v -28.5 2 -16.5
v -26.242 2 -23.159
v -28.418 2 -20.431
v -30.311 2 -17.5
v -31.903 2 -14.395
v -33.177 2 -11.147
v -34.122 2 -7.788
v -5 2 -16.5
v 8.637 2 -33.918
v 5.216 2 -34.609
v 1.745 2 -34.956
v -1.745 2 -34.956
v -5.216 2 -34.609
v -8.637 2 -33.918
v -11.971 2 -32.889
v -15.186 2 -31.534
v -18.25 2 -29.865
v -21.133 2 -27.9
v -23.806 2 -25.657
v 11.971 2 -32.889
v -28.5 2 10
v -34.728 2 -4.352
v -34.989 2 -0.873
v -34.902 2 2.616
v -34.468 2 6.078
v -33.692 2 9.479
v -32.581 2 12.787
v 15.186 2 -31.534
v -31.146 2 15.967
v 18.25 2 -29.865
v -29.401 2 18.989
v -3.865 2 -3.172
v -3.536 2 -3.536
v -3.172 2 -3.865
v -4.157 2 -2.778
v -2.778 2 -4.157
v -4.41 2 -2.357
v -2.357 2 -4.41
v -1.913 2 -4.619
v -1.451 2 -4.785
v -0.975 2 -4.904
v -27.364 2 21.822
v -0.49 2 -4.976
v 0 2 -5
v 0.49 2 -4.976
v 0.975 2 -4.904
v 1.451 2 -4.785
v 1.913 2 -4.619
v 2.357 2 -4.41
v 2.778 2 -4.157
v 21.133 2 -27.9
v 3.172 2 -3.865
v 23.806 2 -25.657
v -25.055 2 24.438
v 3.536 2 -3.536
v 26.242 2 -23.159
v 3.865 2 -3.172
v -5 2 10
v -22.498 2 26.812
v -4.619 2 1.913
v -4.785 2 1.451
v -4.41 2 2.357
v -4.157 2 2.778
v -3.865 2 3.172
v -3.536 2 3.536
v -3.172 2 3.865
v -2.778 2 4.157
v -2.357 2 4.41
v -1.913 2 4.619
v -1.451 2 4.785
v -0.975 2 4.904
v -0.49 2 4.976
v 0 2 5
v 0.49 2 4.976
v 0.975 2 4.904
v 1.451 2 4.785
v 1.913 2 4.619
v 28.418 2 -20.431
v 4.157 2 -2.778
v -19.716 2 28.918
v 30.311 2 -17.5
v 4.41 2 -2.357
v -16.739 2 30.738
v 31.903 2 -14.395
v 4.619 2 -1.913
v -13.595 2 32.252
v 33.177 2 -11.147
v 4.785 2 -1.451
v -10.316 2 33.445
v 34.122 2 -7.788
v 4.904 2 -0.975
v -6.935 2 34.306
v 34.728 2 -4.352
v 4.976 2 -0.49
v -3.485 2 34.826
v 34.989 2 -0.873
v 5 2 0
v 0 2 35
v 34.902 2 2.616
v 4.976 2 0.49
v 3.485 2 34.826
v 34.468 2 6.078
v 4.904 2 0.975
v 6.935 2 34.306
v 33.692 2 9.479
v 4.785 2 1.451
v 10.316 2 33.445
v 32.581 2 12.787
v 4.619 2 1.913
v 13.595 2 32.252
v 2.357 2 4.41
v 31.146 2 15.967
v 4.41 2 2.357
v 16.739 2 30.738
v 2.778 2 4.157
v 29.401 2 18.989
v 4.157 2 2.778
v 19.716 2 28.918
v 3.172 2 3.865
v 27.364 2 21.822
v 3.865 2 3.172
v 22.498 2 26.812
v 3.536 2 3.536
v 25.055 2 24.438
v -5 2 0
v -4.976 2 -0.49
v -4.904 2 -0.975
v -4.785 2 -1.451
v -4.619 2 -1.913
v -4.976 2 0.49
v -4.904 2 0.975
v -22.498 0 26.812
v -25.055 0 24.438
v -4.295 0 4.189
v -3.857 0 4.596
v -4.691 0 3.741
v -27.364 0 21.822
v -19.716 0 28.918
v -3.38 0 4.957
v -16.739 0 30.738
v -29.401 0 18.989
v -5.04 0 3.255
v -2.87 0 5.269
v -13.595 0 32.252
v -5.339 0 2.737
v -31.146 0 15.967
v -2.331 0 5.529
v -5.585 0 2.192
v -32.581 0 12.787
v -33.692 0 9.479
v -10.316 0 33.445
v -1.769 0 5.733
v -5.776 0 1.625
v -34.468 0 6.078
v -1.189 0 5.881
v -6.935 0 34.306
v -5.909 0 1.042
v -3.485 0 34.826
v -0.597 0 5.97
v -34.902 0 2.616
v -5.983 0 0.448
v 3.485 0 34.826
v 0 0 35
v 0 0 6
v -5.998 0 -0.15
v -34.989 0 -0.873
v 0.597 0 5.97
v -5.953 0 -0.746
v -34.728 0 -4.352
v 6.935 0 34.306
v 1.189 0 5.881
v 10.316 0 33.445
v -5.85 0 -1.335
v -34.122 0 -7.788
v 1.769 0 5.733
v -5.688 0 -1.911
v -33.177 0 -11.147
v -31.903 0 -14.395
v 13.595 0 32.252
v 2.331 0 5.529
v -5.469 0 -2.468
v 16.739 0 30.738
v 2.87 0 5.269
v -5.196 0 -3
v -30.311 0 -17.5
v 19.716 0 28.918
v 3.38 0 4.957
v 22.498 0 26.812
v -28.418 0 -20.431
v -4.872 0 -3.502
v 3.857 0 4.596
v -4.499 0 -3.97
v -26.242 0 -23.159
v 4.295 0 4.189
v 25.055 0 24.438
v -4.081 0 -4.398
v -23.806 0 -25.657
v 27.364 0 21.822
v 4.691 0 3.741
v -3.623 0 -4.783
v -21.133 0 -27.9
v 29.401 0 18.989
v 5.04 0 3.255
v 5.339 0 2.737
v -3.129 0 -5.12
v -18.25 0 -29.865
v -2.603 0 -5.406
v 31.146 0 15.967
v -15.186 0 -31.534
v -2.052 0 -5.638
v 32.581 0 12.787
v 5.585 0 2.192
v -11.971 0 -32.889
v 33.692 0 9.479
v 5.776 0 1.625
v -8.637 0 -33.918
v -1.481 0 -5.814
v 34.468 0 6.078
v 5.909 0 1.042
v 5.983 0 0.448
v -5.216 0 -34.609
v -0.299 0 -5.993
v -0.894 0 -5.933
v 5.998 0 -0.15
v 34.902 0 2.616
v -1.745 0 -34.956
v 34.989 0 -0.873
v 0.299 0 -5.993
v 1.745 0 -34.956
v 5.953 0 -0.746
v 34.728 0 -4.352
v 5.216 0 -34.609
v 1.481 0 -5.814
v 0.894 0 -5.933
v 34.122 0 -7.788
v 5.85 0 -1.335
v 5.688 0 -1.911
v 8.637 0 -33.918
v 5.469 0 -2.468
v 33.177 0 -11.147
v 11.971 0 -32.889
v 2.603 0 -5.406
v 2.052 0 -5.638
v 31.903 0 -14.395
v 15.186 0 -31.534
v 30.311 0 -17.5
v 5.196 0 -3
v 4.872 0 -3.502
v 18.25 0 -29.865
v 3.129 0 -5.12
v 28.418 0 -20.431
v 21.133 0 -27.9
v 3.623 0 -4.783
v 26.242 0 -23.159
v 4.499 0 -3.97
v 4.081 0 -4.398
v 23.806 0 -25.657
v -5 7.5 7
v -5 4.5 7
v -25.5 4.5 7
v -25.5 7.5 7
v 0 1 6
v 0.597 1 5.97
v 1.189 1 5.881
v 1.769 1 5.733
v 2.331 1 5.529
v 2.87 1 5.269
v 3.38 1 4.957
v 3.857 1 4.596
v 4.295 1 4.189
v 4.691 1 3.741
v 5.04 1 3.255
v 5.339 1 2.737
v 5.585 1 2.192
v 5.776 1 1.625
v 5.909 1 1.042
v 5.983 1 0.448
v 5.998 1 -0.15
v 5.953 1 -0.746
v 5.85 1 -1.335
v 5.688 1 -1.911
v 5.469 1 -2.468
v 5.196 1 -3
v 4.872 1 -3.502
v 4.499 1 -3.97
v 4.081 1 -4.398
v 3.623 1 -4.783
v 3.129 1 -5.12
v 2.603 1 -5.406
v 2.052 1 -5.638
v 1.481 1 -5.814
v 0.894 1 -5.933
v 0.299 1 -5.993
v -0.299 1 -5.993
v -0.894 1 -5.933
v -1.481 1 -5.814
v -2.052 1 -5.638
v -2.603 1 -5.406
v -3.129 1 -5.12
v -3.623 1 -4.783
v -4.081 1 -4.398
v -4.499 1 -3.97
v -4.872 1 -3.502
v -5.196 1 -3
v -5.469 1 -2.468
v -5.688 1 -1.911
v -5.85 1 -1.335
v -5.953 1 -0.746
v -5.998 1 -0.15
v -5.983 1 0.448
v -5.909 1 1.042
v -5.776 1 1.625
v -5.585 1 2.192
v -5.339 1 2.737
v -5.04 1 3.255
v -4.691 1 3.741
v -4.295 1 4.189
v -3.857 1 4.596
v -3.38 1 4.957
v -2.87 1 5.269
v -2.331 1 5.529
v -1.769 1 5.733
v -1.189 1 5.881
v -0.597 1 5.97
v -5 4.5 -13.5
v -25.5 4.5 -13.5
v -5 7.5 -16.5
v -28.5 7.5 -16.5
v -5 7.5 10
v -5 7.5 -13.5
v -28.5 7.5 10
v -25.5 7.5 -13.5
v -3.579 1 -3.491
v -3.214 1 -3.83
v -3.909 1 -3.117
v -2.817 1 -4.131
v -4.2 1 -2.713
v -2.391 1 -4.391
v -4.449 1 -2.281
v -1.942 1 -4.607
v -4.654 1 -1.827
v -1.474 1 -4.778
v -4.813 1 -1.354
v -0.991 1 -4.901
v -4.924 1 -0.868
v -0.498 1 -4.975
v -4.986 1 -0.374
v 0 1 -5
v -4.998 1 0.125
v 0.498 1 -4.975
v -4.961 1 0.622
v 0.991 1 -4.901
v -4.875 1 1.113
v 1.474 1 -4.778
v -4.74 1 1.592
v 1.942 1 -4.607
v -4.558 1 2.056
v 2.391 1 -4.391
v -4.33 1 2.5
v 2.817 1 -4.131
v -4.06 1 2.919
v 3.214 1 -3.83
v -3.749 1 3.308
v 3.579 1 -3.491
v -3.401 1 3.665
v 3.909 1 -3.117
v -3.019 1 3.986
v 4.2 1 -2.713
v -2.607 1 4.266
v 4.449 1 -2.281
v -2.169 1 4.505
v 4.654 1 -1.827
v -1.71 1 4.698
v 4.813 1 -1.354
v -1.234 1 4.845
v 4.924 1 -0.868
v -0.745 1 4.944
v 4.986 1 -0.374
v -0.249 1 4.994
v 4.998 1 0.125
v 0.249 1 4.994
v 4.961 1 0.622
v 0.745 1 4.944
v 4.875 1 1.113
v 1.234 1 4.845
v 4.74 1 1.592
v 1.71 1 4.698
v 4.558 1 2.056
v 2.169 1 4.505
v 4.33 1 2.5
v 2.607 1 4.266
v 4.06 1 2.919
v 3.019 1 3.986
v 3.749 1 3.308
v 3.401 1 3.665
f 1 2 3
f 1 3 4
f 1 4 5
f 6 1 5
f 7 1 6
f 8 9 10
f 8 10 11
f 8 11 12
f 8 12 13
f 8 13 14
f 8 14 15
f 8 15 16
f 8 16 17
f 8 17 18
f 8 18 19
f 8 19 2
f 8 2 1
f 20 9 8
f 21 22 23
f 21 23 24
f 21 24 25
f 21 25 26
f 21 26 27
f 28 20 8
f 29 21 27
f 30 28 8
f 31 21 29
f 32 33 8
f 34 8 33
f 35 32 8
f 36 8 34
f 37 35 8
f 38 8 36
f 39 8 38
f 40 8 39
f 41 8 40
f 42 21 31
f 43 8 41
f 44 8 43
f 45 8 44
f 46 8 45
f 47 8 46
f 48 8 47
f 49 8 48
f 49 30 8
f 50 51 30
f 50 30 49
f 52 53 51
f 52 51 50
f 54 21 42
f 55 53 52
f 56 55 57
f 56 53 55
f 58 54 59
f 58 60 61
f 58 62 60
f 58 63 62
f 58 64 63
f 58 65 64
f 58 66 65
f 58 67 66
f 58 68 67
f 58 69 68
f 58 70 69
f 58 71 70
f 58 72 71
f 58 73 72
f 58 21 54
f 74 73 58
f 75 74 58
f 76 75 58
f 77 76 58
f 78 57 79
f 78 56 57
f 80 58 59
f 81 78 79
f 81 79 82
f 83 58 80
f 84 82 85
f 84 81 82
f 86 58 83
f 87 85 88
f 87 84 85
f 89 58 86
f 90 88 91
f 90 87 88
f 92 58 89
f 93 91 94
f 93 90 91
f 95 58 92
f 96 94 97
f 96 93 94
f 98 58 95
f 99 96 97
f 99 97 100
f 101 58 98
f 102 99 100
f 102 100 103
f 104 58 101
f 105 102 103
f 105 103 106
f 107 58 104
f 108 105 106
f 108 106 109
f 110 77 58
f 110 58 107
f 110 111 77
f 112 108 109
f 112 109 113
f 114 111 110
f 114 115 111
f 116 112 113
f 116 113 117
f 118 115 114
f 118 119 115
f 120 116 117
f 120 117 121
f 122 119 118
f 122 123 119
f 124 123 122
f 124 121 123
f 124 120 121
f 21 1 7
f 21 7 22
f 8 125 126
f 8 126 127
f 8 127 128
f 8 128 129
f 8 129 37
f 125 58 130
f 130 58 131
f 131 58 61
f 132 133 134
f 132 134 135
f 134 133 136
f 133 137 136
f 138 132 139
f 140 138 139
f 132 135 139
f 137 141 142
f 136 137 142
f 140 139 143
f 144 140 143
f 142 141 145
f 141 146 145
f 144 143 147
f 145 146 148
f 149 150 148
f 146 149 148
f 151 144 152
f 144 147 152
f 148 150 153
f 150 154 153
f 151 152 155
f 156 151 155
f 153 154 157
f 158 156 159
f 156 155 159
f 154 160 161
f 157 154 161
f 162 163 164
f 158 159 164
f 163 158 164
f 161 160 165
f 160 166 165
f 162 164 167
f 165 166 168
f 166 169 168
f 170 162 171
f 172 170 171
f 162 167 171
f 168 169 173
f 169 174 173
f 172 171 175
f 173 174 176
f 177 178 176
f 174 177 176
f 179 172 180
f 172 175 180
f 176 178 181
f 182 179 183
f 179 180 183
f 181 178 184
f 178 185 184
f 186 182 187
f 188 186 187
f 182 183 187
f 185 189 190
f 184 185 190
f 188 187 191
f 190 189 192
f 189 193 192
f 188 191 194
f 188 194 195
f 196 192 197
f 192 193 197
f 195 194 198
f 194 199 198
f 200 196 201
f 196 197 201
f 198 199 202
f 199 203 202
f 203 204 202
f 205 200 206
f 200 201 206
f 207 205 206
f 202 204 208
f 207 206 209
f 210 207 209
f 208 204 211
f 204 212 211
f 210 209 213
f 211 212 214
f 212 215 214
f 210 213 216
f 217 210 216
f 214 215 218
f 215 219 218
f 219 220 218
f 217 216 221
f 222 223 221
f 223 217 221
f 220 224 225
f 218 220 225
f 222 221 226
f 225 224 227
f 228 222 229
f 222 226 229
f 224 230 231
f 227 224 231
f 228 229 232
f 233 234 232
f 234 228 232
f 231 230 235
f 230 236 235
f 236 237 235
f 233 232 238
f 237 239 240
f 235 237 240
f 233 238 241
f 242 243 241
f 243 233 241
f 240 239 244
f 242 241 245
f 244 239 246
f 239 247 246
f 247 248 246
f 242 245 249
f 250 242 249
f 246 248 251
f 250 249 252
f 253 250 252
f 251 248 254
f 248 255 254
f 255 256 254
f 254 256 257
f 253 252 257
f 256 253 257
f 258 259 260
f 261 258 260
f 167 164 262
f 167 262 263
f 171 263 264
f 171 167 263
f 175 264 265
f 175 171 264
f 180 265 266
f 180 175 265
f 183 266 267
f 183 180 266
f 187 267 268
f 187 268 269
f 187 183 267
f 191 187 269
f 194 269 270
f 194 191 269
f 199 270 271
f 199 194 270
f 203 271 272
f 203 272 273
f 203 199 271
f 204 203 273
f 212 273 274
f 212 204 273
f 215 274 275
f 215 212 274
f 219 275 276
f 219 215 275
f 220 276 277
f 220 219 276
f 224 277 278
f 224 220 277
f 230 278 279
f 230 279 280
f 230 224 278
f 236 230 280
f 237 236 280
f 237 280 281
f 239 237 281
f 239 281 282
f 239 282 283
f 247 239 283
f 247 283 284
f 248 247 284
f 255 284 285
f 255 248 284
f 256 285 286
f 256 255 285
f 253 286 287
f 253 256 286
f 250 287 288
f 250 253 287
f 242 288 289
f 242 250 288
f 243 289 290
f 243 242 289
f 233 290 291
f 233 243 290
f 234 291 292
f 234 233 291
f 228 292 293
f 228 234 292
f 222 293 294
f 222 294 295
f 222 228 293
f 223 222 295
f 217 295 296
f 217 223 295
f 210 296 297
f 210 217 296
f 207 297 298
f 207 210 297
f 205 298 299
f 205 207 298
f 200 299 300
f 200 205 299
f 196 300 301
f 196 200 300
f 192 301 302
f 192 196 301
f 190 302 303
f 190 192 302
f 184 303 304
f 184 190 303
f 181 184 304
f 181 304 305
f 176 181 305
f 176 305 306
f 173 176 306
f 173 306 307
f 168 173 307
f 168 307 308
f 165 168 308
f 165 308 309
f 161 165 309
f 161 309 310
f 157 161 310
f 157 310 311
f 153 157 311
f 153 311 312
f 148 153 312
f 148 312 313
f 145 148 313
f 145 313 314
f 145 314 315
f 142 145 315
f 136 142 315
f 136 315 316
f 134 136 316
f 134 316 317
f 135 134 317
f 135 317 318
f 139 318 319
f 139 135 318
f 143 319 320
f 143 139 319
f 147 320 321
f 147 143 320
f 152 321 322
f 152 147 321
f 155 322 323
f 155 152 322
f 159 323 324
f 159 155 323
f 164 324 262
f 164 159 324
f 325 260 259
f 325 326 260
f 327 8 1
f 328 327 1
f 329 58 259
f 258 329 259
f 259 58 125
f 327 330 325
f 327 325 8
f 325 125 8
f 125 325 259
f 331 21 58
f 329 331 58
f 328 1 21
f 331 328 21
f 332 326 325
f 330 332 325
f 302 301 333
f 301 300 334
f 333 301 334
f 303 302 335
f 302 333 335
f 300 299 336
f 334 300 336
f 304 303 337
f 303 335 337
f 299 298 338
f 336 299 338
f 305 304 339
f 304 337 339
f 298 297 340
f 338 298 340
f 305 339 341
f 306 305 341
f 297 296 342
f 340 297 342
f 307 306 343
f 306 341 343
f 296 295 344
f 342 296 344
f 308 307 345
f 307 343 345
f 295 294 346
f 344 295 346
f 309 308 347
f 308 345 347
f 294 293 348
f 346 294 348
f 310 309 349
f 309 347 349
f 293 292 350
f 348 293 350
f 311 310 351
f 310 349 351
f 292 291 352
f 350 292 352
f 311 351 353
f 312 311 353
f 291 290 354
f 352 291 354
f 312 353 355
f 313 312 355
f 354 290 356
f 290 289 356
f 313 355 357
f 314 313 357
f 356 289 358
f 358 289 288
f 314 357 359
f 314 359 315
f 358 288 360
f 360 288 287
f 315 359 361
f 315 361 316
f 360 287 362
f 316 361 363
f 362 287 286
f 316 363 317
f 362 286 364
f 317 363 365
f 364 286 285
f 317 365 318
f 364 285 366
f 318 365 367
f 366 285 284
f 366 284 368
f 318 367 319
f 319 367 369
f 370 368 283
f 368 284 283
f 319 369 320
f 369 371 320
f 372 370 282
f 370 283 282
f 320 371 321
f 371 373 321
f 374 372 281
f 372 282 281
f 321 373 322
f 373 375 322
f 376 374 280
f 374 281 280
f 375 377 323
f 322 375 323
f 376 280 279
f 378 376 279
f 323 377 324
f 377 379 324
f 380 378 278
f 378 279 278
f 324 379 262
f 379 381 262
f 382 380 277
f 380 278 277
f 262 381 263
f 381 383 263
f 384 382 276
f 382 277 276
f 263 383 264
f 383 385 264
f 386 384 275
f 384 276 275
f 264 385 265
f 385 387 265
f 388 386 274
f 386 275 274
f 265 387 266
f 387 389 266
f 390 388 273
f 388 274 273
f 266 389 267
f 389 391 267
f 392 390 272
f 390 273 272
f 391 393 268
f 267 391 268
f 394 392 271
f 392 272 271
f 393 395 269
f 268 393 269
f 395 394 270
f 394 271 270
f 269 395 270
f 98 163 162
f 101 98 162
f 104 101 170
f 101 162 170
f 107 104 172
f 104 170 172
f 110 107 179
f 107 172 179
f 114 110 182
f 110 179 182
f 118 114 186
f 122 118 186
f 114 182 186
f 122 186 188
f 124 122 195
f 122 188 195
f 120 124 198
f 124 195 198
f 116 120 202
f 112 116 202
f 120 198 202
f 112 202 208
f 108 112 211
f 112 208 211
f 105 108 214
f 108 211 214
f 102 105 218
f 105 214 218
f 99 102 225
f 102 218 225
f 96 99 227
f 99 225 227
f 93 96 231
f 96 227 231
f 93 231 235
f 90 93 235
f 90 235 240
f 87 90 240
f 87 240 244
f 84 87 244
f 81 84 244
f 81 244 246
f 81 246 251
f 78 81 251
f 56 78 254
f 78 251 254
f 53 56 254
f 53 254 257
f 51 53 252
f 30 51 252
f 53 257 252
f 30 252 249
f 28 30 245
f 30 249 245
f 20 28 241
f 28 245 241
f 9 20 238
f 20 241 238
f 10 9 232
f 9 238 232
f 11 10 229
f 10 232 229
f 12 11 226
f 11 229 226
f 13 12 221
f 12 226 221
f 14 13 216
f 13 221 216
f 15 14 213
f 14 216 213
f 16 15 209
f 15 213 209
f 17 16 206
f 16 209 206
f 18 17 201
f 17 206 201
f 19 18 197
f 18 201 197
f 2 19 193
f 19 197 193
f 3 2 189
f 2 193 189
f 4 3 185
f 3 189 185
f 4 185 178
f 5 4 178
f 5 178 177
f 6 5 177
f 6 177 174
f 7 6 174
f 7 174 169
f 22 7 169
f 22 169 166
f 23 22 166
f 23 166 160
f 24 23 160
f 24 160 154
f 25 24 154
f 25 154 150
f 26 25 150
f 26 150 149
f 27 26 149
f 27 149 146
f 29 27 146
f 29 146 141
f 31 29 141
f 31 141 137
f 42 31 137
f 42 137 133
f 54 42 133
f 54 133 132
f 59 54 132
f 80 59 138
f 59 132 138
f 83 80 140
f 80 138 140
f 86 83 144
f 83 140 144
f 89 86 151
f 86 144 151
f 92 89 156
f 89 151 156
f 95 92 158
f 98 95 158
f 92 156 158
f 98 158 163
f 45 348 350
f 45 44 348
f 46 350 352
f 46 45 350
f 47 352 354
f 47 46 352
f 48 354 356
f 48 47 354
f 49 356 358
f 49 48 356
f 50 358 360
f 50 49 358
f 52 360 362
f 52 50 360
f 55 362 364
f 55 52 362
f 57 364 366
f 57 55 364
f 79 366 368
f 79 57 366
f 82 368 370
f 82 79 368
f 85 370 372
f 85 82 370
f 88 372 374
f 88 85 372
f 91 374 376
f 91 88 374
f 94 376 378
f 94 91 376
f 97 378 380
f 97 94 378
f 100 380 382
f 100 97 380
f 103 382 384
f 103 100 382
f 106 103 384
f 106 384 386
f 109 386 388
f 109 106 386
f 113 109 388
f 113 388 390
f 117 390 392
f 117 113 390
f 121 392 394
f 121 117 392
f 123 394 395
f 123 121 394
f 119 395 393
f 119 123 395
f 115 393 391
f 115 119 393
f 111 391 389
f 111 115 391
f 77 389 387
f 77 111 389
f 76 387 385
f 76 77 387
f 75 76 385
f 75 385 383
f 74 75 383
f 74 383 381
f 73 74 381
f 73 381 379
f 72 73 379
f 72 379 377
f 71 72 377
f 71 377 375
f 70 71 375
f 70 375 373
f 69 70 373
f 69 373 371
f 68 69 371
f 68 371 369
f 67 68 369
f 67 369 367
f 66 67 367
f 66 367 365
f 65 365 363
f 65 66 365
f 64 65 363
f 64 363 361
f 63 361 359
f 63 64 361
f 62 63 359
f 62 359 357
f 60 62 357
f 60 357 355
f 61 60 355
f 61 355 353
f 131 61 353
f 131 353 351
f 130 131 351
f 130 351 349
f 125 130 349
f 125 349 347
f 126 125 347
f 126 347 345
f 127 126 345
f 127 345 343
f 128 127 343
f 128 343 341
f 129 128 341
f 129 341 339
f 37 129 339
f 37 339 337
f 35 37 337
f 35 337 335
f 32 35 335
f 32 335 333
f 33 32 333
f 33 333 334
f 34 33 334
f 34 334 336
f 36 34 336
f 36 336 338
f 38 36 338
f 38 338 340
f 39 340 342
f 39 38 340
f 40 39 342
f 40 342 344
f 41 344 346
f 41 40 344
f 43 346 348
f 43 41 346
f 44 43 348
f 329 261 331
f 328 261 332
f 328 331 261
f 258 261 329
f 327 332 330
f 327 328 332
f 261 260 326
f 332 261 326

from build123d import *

# Parameters (mm, degrees)
SKETCH1_R               = 35
BOSS_EXTRUDE1_DEPTH     = 2
SKETCH3_R               = 6
CUT_EXTRUDE2_DEPTH      = 1
BOSS_EXTRUDE2_DEPTH     = 7.5
CUT_EXTRUDE3_DEPTH      = 50.922439844
CUT_EXTRUDE3_DEPTH_BACK = 50.922439844
SKETCH5_R               = 5
SKETCH6_W               = 23.5
SKETCH6_H               = 26.5
BOSS_EXTRUDE3_DEPTH     = 2.5


with BuildPart() as part:
    # Sketch1 → Boss-Extrude1 (new body)
    with BuildSketch(Plane(origin=(0, 0, 0), x_dir=(1, 0, 0), z_dir=(0, 1, 0))):
        with Locations(Location((0, 0, 0), (0, 0, 270))):
            Circle(SKETCH1_R)
    extrude(amount=BOSS_EXTRUDE1_DEPTH)

    # Sketch3 → Cut-Extrude2 (cut)
    with BuildSketch(Plane(origin=(0, 0, 0), x_dir=(1, 0, 0), z_dir=(0, 1, 0))):
        with Locations(Location((0, 0, 0), (0, 0, 270))):
            Circle(SKETCH3_R)
    extrude(amount=CUT_EXTRUDE2_DEPTH, mode=Mode.SUBTRACT)

    # Sketch4 → Boss-Extrude2 (add)
    with BuildSketch(Plane(origin=(0, 0, 0), x_dir=(1, 0, 0), z_dir=(0, 1, 0))):
        Polygon((-5, 13.5), (-5, 16.5), (-28.5, 16.5), (-28.5, -10), (-5, -10), (-5, -7), (-25.5, -7), (-25.5, 13.5), align=None)
    extrude(amount=BOSS_EXTRUDE2_DEPTH)

    # Sketch5 → Cut-Extrude3 (cut, two sides: drawn at the far end of the back side and taken through both)
    with BuildSketch(Plane.XZ.offset(-1).offset(-CUT_EXTRUDE3_DEPTH_BACK)):
        with Locations(Location((0, 0, 0), (0, 0, 270))):
            Circle(SKETCH5_R)
    extrude(amount=CUT_EXTRUDE3_DEPTH + CUT_EXTRUDE3_DEPTH_BACK, mode=Mode.SUBTRACT)

    # Sketch6 → Boss-Extrude3 (add)
    with BuildSketch(Plane(origin=(0, 2, 0), x_dir=(1, 0, 0), z_dir=(0, 1, 0))):
        with Locations((-16.75, 3.25)):
            Rectangle(SKETCH6_W, SKETCH6_H)
    extrude(amount=BOSS_EXTRUDE3_DEPTH)


solid = part.part
